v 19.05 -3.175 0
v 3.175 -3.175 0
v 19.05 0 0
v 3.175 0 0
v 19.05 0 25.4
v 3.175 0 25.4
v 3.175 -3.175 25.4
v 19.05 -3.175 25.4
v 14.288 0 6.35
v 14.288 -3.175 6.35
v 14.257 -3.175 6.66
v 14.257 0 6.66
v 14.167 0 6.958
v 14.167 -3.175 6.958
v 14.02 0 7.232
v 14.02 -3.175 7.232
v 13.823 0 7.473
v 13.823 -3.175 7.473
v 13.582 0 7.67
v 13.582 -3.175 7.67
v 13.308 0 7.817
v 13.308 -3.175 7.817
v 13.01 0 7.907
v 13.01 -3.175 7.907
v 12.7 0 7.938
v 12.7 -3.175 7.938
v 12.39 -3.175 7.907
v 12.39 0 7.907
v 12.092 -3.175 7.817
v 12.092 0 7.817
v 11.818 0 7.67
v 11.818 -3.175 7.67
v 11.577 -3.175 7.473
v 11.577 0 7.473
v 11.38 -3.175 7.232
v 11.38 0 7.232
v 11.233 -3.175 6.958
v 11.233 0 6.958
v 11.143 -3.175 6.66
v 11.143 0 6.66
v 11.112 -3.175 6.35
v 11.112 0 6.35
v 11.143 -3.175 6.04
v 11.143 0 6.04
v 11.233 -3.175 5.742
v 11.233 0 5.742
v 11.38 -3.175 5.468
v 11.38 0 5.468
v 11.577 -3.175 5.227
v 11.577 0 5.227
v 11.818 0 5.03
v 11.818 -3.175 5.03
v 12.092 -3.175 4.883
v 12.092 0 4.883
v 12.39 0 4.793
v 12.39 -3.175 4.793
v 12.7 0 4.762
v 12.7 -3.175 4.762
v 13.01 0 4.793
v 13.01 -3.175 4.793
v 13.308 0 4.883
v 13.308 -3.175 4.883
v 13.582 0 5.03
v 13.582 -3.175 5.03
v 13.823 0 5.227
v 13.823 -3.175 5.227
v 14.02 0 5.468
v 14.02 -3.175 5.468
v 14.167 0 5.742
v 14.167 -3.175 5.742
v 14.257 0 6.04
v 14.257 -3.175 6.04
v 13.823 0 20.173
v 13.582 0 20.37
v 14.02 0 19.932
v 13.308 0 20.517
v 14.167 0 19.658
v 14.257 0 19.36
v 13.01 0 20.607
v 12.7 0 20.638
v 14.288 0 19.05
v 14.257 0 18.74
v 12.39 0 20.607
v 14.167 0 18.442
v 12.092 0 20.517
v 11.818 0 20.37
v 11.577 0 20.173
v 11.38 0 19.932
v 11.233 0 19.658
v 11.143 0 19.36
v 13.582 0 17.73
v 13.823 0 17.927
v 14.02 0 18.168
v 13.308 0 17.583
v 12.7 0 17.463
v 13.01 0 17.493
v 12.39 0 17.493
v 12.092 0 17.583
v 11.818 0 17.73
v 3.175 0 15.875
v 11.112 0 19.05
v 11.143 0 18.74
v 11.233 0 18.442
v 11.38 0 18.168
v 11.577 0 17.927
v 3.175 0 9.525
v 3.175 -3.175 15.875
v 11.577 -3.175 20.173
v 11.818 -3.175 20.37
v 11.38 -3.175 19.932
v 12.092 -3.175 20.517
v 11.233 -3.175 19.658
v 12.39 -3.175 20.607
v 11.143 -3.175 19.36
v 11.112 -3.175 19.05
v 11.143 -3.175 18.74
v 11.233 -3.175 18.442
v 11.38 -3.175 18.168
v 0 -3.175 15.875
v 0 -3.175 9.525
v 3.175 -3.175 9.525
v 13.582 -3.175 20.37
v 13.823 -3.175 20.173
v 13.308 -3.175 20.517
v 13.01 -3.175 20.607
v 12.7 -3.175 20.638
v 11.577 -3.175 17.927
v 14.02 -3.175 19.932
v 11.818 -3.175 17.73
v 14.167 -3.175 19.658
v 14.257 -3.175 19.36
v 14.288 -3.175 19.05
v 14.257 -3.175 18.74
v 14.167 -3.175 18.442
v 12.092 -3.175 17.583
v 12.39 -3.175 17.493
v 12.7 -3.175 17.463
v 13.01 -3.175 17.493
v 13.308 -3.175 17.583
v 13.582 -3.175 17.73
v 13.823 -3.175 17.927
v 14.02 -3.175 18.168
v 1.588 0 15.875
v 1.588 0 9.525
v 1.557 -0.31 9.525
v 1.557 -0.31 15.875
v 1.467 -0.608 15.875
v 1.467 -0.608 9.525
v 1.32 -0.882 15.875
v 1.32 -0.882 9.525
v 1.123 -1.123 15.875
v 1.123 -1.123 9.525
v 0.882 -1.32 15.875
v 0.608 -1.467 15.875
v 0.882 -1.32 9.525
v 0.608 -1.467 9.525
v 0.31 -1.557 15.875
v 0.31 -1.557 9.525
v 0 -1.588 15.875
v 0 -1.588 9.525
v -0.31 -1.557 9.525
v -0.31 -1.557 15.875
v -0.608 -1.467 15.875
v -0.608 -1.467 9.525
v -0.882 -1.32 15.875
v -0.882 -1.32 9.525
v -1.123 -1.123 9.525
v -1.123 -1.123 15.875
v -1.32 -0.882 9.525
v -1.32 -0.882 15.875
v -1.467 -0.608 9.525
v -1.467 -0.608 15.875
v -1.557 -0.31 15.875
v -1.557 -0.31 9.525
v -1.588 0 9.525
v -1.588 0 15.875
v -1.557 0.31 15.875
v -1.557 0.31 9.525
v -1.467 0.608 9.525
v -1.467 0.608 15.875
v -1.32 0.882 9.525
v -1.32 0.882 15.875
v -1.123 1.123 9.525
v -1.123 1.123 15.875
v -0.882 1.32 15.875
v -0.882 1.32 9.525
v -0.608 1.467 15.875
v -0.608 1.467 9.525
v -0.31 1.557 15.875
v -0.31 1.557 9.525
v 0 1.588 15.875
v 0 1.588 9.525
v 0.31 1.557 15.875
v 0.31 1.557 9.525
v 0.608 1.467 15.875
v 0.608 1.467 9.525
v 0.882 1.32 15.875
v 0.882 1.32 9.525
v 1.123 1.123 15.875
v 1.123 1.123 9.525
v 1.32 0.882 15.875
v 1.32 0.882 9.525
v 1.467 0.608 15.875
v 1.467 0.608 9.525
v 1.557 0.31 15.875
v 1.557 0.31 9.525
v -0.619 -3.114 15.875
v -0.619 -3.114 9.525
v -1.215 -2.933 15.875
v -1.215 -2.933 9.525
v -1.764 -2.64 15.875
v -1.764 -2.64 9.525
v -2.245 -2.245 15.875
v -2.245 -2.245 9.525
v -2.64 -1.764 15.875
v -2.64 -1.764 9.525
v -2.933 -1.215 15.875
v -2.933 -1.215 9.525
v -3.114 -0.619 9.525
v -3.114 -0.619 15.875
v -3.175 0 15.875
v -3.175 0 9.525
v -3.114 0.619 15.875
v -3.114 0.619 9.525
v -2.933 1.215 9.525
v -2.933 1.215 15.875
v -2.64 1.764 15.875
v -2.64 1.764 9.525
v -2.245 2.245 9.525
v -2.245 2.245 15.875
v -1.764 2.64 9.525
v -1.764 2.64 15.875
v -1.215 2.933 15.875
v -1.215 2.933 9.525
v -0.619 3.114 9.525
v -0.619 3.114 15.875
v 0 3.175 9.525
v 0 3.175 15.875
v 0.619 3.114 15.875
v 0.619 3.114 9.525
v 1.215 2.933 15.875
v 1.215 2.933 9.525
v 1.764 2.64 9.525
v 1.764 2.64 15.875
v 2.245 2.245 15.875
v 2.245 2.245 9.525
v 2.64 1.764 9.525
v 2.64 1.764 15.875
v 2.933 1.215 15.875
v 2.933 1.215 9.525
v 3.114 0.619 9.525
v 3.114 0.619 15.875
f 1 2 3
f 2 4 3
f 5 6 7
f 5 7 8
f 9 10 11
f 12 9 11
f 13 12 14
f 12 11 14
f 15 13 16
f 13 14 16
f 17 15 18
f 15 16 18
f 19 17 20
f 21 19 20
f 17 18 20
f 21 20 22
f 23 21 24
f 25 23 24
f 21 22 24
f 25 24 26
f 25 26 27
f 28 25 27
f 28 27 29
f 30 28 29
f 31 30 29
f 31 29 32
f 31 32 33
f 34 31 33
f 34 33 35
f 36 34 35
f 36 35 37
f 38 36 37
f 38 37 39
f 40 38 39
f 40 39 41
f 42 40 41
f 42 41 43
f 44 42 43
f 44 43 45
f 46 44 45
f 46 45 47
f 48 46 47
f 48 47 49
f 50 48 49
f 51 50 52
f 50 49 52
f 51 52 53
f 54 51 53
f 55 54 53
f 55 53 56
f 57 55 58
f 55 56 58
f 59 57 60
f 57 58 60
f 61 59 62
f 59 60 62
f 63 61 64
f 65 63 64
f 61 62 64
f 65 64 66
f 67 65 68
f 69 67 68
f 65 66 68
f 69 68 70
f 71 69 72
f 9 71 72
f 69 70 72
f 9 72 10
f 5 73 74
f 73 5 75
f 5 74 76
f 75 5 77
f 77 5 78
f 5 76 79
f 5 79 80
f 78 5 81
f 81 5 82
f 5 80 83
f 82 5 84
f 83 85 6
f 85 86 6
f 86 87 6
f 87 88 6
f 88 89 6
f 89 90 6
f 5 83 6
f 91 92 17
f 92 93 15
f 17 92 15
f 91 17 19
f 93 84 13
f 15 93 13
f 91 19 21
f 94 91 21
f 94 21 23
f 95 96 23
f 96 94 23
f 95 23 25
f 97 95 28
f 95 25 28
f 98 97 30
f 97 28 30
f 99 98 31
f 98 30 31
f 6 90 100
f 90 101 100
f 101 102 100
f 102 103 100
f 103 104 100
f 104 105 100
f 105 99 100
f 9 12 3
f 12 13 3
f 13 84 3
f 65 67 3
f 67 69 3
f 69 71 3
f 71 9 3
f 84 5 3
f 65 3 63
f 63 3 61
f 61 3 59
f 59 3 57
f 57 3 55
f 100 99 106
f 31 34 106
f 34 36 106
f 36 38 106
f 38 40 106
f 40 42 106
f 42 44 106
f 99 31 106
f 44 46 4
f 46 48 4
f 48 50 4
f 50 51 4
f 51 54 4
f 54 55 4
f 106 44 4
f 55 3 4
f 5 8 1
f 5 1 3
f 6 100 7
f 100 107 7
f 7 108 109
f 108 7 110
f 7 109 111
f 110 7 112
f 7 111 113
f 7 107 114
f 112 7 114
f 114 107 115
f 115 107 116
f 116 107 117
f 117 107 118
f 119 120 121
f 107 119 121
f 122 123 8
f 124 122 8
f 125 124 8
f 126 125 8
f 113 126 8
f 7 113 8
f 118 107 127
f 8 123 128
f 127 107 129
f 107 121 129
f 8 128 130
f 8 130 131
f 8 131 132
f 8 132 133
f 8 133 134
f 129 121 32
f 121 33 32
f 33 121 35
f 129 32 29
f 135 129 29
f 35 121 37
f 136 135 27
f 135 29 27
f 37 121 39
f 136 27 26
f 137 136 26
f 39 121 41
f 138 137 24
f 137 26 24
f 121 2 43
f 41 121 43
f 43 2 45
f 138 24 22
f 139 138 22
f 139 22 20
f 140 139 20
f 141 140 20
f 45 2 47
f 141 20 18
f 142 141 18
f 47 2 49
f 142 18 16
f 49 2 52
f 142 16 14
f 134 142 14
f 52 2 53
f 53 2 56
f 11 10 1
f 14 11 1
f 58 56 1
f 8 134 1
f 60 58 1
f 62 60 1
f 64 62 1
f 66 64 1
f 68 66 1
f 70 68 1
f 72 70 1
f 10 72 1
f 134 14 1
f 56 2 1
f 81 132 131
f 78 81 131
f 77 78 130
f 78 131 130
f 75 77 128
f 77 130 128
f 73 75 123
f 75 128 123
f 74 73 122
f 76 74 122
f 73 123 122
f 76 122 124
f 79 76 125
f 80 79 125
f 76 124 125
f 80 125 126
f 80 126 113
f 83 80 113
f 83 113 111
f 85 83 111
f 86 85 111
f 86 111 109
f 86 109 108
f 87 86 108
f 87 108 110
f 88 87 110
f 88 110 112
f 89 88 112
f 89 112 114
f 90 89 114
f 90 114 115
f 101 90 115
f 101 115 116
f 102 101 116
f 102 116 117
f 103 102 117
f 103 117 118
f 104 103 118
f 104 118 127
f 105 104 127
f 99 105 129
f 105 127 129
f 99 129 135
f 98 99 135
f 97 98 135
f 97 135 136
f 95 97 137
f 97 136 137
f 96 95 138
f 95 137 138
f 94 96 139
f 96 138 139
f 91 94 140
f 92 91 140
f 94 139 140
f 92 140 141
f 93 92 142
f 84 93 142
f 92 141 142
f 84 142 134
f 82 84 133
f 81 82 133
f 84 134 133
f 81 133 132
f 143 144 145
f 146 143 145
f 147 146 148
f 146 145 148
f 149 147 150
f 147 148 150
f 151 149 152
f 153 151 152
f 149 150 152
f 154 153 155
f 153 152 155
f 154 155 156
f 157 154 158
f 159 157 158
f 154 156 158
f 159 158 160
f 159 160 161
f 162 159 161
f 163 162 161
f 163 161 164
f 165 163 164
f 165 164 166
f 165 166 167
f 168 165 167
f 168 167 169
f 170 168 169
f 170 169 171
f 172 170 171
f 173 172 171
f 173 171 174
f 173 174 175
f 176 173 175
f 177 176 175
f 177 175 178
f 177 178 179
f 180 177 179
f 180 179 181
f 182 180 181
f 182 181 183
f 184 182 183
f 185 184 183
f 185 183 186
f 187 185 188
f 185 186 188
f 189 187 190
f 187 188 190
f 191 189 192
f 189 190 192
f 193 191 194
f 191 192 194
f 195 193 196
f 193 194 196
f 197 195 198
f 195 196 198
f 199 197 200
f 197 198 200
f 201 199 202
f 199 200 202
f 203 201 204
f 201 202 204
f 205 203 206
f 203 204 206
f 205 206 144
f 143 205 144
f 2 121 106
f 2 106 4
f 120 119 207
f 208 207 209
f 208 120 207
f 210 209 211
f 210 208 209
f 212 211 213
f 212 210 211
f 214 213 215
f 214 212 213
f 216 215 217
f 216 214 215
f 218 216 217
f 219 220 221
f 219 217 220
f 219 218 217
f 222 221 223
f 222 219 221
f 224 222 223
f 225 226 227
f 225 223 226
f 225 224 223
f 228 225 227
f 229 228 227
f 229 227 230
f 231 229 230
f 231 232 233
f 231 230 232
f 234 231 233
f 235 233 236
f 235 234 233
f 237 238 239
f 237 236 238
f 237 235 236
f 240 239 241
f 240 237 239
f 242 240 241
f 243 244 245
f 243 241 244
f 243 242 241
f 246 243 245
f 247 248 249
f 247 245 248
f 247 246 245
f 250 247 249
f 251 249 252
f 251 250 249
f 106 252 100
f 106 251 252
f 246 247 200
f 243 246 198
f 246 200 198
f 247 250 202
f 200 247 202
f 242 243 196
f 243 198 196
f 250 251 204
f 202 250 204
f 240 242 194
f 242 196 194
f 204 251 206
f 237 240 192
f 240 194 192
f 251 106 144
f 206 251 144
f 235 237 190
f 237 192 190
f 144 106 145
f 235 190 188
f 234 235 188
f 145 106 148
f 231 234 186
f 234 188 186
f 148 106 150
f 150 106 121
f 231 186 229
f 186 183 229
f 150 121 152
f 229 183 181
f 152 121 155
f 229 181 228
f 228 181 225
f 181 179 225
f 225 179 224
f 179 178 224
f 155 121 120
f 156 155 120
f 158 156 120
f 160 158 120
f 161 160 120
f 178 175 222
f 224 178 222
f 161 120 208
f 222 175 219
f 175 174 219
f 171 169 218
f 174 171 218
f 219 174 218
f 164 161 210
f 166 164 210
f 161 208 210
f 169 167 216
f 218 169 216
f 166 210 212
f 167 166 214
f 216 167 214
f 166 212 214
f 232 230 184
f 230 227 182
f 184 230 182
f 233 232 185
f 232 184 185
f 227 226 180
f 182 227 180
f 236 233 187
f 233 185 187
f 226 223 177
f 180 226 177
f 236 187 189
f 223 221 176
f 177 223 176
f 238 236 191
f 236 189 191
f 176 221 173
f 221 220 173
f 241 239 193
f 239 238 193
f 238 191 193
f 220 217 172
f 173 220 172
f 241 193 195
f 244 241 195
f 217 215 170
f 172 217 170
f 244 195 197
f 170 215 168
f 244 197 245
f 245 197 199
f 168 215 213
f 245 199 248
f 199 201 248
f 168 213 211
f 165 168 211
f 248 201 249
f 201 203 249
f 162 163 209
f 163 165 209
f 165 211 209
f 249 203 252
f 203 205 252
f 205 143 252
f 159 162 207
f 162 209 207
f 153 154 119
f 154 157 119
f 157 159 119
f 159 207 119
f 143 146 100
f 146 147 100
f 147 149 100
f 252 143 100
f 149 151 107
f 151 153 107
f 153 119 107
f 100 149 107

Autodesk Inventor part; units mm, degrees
ref_plane "YZ Plane" through (0, 0, 0) normal (1, 0, 0) x (0, 1, 0)
ref_plane "XZ Plane" through (0, 0, 0) normal (0, 1, 0) x (-1, 0, 0)
ref_plane "XY Plane" through (0, 0, 0) normal (0, 0, 1) x (1, 0, 0)
sketch "Sketch1" plane through (0, 0, 0) normal (0, 0, 1) x (1, 0, 0)
  circle A0 centre (0, 0) radius 3.175
  circle A1 centre (0, 0) radius 1.5875
  line L0 (0, -3.175) -> (19.05, -3.175)
  line L1 (19.05, -3.175) -> (19.05, 0)
  line L2 (19.05, 0) -> (1.5875, 0)
  line L3 (0, -1.5875) -> (0, -3.175)
  dimension "d1" = 6.35
  dimension "d0" = 3.175
  dimension "d2" = 3.175
  dimension "d3" = 19.05
extrude "Extrusion1" add sketch "Sketch1" along normal blind 25.4 contours L2 A1 L3 A0 | L2 L1 L0 A0 | A0 L3 A1 L2
sketch "Sketch2" plane through (0, -3.175, 0) normal (0, -1, 0) x (1, 0, 0)
  line L0 (19.05, 25.4) -> (0, 25.4) projected
  line L1 (0, 0) -> (19.05, 0) projected
  line L2 (3.175, 9.525) -> (-3.175, 9.525)
  line L3 (-3.175, 9.525) -> (-3.175, 15.875)
  line L4 (-3.175, 15.875) -> (3.175, 15.875)
  line L5 (3.175, 15.875) -> (3.175, 9.525)
  line L6 (-1.5875, 25.4) -> (1.5875, 25.4) projected
  line L7 (-3.175, 9.525) -> (3.175, 9.525)
  line L8 (3.175, 9.525) -> (3.175, 0)
  line L9 (3.175, 0) -> (-3.175, 0)
  line L10 (-3.175, 0) -> (-3.175, 9.525)
  line L11 (-3.175, 15.875) -> (3.175, 15.875)
  line L12 (3.175, 15.875) -> (3.175, 25.4)
  line L13 (3.175, 25.4) -> (-3.175, 25.4)
  line L14 (-3.175, 25.4) -> (-3.175, 15.875)
  line L15 (3.175, 9.525) -> (3.175, 0)
  line L16 (0, 0) -> (3.175, 0)
  circle A0 centre (12.7, 19.05) radius 1.5875
  circle A1 centre (12.7, 6.35) radius 1.5875
  dimension "d6" = 6.35
  dimension "d7" = 6.35
  dimension "d8" = 9.525
  dimension "d9" = 3.175
  dimension "d10" = 3.175
  dimension "d13" = 3.175
  dimension "d14" = 3.175
  dimension "d15" = 6.35
  dimension "d16" = 6.35
  dimension "d17" = 12.7
  dimension "d18" = 6.35
extrude "Extrusion2" cut sketch "Sketch2" against normal blind 25.4 contours L12 L4 L14 L13 L6 L0 | L8 L1 L9 L10 L2 | A0 | A1
properties part number "hinge one prong"
